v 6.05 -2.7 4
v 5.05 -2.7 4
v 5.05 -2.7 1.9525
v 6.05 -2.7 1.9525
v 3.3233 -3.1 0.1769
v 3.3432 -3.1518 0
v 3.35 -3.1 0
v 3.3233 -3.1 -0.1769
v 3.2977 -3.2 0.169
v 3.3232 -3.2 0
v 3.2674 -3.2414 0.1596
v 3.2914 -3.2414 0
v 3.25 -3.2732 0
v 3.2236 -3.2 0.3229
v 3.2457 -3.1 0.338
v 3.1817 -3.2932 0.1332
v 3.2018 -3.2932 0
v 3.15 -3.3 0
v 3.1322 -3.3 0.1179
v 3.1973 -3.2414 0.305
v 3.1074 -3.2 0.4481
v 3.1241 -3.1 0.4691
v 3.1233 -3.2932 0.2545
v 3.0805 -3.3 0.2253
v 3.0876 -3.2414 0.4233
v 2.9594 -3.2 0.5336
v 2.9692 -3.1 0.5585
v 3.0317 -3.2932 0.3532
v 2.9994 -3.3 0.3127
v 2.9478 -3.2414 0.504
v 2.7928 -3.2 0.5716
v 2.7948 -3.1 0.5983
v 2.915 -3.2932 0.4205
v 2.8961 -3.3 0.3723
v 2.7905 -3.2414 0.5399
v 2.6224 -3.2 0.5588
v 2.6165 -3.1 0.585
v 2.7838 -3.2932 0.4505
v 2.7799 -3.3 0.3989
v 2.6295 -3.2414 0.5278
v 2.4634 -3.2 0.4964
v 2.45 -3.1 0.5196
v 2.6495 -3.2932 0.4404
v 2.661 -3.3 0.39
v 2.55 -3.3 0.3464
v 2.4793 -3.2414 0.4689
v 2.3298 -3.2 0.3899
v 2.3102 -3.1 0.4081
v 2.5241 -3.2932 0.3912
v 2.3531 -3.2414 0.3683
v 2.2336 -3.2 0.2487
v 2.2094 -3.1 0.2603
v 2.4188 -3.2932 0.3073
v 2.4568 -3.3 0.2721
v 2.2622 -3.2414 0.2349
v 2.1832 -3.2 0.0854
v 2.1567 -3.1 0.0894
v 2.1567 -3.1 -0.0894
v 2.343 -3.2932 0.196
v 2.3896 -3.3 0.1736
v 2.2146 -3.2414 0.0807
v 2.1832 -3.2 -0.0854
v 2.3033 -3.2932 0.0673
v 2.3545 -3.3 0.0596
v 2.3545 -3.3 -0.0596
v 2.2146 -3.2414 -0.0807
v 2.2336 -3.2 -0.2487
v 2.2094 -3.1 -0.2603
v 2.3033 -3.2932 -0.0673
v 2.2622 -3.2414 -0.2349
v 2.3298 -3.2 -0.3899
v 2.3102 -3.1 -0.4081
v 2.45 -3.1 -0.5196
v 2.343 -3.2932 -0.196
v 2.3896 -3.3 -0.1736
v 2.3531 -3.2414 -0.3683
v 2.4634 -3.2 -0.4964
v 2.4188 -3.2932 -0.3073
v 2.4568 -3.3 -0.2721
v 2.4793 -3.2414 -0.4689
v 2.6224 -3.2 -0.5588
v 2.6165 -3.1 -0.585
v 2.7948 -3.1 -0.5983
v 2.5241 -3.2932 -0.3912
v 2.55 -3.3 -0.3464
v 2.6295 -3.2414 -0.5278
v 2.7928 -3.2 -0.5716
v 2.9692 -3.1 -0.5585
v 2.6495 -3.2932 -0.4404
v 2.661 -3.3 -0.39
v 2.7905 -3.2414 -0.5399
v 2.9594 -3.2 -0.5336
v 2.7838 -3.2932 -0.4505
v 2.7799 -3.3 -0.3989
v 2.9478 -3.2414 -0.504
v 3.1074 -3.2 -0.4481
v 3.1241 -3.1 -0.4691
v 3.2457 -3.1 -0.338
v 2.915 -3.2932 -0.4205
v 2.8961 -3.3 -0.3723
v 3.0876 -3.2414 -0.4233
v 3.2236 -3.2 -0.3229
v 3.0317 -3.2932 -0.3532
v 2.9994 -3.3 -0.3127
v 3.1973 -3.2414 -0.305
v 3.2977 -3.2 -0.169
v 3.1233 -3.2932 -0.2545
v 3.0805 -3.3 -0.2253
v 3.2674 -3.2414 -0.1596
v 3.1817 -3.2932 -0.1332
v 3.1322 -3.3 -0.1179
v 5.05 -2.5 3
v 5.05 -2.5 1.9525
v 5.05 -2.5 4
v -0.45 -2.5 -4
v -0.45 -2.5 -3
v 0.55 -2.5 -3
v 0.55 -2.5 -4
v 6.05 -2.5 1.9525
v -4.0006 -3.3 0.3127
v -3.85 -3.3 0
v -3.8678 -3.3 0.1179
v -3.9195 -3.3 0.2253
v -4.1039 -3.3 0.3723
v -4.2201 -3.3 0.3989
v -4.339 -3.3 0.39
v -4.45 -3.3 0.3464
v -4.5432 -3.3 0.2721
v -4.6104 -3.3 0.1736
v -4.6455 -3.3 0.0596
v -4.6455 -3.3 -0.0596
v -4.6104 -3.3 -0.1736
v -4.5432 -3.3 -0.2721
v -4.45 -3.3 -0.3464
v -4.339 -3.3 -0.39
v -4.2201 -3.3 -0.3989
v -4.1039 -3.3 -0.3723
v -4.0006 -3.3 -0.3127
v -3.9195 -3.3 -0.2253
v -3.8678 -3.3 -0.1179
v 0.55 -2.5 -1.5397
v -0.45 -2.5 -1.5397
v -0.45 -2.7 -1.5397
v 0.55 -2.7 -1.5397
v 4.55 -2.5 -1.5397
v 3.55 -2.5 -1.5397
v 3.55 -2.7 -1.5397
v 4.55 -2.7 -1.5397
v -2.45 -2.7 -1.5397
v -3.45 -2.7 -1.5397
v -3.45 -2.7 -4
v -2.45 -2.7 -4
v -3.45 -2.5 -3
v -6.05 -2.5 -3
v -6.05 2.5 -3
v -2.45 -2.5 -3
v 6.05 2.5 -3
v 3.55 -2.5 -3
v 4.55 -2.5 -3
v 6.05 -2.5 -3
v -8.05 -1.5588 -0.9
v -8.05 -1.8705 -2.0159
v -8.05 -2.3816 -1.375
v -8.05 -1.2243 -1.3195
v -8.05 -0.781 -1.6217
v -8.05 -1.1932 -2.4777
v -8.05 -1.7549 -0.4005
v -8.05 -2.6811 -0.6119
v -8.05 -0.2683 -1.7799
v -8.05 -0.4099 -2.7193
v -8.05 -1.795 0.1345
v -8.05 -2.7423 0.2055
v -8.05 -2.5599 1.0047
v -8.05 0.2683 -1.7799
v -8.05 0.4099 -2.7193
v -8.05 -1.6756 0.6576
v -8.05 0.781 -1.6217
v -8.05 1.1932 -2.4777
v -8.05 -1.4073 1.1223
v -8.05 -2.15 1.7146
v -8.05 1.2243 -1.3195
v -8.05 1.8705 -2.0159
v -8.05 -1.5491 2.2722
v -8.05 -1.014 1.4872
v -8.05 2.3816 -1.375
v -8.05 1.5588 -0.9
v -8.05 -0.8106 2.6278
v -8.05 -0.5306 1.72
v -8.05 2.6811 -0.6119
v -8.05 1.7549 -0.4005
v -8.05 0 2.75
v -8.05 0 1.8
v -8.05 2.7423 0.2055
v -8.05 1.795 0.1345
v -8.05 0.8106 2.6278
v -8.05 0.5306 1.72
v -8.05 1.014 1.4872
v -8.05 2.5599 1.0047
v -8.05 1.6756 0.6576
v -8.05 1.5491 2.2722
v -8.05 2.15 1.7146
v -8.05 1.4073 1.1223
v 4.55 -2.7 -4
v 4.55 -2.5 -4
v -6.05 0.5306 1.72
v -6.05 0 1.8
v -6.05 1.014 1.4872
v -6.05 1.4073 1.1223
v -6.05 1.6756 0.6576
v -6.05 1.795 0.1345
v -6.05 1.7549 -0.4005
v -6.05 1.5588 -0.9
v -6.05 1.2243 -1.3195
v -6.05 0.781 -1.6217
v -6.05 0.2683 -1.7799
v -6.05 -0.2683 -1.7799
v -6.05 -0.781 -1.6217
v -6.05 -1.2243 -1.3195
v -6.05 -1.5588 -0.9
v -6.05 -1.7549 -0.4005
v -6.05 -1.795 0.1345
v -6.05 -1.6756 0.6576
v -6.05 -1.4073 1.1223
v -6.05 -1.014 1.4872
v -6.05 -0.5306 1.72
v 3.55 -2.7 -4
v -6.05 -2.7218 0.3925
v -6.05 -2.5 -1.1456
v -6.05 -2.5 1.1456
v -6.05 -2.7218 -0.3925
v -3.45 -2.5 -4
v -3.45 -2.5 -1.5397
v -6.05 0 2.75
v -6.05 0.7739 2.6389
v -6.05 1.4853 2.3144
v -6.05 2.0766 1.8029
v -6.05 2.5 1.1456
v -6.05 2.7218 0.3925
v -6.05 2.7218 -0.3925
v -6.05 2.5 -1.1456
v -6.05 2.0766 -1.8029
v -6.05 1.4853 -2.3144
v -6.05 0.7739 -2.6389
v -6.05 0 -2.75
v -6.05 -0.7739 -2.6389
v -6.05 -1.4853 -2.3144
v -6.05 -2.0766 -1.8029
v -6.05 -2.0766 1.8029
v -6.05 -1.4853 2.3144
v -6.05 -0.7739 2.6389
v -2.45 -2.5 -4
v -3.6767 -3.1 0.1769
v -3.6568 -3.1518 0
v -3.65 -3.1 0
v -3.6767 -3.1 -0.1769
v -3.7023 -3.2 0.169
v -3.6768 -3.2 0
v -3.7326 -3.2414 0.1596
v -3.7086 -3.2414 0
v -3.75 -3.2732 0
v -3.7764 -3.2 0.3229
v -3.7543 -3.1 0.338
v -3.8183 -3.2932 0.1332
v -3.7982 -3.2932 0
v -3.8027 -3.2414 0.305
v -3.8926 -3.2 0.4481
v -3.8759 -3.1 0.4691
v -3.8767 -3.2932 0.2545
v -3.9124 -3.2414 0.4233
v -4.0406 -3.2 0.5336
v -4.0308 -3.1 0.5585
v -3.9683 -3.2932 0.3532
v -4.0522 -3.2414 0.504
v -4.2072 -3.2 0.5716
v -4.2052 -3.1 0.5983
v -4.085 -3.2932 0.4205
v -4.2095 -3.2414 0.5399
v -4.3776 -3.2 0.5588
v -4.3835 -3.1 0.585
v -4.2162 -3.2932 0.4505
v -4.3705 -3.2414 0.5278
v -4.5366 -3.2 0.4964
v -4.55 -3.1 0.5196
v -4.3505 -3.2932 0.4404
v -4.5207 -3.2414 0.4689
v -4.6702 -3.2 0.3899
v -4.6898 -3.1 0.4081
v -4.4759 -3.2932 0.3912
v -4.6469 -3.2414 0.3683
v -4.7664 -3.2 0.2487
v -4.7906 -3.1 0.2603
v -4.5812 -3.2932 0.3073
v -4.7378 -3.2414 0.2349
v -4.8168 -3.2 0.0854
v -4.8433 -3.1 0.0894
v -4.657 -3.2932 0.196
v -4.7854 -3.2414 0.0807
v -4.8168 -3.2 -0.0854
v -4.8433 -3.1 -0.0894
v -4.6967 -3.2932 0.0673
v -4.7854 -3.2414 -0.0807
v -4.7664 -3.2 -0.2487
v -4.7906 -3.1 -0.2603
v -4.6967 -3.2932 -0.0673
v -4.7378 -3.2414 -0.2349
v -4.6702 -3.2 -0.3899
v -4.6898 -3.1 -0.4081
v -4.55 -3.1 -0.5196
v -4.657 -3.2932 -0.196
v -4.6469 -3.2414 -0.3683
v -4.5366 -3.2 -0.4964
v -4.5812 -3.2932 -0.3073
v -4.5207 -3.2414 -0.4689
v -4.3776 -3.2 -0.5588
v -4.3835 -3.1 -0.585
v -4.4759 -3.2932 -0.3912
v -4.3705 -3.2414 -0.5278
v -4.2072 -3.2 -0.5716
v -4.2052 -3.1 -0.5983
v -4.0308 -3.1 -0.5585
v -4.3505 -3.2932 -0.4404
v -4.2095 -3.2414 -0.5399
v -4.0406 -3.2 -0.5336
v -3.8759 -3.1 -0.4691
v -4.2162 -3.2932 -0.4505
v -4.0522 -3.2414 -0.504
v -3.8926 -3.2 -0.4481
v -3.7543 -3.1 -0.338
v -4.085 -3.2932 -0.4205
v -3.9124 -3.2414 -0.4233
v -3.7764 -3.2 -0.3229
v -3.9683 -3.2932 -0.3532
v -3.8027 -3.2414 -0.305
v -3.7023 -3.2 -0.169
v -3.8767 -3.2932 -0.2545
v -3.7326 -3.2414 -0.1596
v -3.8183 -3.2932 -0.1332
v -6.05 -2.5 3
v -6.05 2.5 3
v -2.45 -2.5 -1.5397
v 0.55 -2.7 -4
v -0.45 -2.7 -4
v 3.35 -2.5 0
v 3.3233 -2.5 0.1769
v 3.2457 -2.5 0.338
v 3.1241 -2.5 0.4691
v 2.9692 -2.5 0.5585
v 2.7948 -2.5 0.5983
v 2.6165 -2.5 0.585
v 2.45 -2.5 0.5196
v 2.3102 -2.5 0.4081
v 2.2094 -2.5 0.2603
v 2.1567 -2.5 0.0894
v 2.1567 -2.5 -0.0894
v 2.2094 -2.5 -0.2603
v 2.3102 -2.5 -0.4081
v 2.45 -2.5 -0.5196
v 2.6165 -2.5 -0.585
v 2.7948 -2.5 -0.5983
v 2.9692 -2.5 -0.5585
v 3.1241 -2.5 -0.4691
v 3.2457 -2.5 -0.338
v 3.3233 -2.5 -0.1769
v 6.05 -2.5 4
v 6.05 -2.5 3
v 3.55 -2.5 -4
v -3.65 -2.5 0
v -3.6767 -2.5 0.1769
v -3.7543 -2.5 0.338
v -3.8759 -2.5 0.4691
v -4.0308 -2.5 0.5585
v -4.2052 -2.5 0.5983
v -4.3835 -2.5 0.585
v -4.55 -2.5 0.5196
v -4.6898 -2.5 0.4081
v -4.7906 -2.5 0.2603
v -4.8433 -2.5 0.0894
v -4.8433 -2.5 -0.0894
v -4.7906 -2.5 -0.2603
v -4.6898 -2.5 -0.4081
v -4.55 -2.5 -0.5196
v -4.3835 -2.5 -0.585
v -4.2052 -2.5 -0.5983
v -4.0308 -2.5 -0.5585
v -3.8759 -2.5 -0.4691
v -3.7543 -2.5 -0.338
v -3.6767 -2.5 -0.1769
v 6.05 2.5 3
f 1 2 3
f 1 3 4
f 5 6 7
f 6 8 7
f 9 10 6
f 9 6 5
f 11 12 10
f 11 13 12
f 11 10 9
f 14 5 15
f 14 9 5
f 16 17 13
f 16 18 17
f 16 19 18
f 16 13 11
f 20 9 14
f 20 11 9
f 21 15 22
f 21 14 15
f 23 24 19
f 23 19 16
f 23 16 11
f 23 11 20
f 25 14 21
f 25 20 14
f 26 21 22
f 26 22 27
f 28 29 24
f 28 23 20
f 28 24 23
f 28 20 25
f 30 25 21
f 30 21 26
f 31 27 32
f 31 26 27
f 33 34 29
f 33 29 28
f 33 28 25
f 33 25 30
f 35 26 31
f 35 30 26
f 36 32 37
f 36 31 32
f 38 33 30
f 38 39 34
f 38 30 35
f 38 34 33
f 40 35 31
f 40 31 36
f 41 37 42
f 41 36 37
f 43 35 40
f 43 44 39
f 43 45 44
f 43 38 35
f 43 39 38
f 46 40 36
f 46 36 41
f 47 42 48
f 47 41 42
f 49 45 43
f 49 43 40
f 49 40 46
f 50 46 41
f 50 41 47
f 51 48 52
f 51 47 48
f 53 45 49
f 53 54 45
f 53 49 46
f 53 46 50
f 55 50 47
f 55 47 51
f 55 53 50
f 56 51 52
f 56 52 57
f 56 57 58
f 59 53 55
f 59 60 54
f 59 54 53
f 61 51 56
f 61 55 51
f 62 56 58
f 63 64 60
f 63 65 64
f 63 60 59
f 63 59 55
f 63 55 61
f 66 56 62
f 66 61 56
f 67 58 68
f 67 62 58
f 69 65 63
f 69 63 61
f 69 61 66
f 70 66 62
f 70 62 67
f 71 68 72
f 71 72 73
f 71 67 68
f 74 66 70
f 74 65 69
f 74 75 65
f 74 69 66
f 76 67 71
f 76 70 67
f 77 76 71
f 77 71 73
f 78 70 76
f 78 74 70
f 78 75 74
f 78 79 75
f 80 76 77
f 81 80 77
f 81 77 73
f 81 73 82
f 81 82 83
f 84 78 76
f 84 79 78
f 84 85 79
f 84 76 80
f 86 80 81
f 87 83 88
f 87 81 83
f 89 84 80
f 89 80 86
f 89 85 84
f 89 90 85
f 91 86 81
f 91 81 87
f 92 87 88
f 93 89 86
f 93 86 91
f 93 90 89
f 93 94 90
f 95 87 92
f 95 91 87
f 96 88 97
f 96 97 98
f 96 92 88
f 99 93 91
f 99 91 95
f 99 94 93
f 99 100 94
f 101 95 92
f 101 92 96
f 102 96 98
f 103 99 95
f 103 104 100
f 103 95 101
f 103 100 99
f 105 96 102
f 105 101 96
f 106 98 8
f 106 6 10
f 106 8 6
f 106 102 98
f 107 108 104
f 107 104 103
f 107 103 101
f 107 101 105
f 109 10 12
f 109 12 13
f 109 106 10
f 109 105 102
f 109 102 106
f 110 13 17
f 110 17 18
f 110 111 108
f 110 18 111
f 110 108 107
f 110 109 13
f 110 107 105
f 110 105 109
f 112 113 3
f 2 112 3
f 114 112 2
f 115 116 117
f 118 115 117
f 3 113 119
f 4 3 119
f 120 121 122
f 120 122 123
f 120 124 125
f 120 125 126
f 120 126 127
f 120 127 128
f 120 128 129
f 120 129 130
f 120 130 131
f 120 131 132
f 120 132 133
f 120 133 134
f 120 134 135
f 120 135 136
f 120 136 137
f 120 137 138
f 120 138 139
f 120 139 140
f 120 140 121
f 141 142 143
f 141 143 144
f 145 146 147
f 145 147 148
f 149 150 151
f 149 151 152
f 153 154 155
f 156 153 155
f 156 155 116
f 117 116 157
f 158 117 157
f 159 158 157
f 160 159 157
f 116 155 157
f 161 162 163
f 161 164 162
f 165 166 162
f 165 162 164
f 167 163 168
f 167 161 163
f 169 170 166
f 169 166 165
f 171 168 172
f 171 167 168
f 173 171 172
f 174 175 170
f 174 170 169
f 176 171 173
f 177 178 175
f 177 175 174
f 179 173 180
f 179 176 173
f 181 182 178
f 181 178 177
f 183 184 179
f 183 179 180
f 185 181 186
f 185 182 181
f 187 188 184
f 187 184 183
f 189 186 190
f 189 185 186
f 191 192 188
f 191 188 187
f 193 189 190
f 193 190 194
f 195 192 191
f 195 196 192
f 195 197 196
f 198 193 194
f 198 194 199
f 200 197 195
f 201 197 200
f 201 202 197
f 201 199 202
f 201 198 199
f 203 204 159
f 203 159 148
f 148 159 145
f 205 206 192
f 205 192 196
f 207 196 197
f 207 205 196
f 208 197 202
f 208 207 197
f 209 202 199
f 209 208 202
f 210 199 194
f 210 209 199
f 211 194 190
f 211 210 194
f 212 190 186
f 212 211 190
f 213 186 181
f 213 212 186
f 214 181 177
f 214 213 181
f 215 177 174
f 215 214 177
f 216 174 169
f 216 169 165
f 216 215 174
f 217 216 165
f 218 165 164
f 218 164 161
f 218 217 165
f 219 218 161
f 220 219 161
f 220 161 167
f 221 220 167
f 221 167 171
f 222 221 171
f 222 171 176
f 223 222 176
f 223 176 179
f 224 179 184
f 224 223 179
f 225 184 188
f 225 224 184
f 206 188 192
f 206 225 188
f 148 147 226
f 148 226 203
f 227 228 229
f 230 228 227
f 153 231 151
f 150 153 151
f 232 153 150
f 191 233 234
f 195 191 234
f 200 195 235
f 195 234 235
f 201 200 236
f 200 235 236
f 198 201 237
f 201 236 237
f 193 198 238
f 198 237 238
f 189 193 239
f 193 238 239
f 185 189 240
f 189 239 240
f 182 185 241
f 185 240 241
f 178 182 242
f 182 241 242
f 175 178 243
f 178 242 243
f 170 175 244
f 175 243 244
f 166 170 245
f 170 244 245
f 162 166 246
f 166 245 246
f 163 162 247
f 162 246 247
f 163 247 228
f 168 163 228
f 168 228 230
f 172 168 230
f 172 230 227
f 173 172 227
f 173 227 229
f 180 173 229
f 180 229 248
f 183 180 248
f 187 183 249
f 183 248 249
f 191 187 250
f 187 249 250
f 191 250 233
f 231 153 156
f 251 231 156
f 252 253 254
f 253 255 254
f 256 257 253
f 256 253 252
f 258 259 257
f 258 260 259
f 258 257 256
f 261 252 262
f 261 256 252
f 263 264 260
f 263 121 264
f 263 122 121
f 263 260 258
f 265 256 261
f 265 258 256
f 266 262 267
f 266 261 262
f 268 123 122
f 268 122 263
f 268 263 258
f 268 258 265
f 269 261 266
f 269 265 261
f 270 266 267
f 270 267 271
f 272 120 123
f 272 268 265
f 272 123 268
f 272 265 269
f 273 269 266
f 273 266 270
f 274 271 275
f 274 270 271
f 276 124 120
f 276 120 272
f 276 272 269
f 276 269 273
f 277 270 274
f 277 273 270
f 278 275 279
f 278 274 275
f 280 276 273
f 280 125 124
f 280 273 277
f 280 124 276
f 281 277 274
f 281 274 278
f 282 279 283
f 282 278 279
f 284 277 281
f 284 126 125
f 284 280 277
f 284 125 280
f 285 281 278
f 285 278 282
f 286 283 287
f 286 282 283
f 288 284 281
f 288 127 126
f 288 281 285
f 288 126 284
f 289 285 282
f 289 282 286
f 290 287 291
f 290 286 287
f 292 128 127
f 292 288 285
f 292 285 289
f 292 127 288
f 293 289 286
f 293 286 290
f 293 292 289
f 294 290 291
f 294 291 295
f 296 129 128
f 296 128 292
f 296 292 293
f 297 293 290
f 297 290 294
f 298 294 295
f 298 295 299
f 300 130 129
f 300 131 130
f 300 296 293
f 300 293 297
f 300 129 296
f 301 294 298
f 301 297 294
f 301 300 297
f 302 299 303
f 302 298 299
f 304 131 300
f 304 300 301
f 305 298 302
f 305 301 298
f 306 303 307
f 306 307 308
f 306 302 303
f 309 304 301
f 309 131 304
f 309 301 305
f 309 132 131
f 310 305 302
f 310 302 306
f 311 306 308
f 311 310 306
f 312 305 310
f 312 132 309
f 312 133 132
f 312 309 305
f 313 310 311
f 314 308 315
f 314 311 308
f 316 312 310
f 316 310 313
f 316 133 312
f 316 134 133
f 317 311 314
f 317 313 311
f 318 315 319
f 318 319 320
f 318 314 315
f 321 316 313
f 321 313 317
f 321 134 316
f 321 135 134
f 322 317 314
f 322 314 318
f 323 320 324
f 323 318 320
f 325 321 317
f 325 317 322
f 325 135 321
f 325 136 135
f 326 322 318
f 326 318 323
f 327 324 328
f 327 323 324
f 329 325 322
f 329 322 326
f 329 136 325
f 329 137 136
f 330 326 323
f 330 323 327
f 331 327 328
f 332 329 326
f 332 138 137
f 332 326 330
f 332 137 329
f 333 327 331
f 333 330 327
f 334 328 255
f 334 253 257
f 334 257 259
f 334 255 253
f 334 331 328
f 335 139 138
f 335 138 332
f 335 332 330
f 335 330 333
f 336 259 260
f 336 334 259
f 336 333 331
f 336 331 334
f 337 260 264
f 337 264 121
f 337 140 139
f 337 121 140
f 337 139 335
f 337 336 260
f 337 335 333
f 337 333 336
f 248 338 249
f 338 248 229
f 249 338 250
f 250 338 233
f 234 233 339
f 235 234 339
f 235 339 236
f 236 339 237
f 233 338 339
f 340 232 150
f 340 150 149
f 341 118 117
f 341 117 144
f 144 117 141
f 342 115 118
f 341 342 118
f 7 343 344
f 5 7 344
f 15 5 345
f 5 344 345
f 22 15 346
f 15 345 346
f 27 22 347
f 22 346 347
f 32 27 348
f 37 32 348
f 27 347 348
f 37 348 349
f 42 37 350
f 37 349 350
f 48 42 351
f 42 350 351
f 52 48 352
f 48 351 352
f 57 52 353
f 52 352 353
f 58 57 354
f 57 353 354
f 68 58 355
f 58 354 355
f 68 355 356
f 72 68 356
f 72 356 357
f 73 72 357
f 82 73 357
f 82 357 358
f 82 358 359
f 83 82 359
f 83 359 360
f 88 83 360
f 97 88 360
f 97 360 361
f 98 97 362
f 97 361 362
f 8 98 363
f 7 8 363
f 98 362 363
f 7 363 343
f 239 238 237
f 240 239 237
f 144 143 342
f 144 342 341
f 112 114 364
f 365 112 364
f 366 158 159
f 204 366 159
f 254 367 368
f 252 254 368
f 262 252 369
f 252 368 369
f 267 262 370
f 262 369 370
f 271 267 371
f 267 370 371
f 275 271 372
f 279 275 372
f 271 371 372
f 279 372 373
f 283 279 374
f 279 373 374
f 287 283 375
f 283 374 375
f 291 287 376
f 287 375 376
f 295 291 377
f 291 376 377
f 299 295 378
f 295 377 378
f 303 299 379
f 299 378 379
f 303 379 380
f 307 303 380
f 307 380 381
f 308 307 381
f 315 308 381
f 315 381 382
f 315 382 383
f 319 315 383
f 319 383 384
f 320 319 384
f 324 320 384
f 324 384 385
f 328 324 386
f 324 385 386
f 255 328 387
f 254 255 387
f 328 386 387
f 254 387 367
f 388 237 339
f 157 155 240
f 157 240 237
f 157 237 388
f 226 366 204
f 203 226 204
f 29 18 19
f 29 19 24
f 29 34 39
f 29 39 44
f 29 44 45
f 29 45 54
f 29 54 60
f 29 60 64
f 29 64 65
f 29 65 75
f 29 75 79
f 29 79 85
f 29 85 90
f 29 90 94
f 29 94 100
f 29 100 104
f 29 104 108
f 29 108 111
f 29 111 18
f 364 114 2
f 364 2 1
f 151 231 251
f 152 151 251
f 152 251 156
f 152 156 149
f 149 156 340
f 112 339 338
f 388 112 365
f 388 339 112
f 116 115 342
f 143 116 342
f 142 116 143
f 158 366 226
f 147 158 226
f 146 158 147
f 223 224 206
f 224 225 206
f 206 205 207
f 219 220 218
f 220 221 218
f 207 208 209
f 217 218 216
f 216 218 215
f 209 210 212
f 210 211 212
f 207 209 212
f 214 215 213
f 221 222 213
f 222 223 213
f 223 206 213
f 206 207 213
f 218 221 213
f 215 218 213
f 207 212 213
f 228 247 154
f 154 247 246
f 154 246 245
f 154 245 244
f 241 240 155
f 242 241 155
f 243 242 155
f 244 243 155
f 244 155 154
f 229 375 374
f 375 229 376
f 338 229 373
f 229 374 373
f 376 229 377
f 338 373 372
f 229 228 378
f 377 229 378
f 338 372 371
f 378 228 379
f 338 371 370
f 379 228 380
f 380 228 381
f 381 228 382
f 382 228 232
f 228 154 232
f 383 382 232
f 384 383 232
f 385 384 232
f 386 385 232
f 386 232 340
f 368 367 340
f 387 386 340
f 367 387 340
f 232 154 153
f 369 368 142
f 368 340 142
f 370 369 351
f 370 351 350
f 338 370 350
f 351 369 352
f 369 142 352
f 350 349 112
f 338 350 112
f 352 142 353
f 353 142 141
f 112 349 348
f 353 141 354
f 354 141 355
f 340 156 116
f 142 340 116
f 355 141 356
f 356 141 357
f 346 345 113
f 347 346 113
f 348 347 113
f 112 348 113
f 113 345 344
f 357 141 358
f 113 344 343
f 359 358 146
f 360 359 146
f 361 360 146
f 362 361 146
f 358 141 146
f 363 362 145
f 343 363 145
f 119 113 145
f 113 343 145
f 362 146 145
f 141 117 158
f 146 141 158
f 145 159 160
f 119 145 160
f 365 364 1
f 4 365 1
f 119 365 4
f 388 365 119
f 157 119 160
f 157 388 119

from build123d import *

# Parameters (mm, degrees)
SKETCH1_W           = 12.1
SKETCH1_H           = 6
BOSS_EXTRUDE1_DEPTH = 2.5
SKETCH2_R           = 2.75
SKETCH2_R_2         = 1.8
BOSS_EXTRUDE2_DEPTH = 2
SKETCH3_R           = 0.6
BOSS_EXTRUDE3_DEPTH = 0.8
FILLET1_R           = 0.2
SKETCH4_W           = 1
SKETCH4_H           = 2.460309858
SKETCH4_H_2         = 2.047502849
BOSS_EXTRUDE4_DEPTH = 0.2


with BuildPart() as part:
    # Sketch1 → Boss-Extrude1 (new body, symmetric)
    with BuildSketch(Plane(origin=(0, 0, 0), x_dir=(1, 0, 0), z_dir=(0, 1, 0))):
        Rectangle(SKETCH1_W, SKETCH1_H)
    extrude(amount=BOSS_EXTRUDE1_DEPTH, both=True)

    # Sketch2 → Boss-Extrude2 (add)
    with BuildSketch(Plane.ZY.offset(6.05)):
        Circle(SKETCH2_R)
        Circle(SKETCH2_R_2, mode=Mode.SUBTRACT)
    extrude(amount=BOSS_EXTRUDE2_DEPTH)

    # Sketch3 → Boss-Extrude3 (add)
    with BuildSketch(Plane.XZ.offset(2.5)):
        with Locations((-4.25, 0)):
            Circle(SKETCH3_R)
        with Locations((2.75, 0)):
            Circle(SKETCH3_R)
    extrude(amount=BOSS_EXTRUDE3_DEPTH)

    # Fillet1
    fillet1_edges = [part.edges().sort_by_distance(p)[0] for p in [
        (-4.85, -3.3, 0),
        (2.15, -3.3, 0),
    ]]
    fillet(fillet1_edges, radius=FILLET1_R)

    # Sketch4 → Boss-Extrude4 (add)
    with BuildSketch(Plane.XZ.offset(2.5)):
        with Locations((-2.95, -2.769845071)):
            Rectangle(SKETCH4_W, SKETCH4_H)
        with Locations((0.05, -2.769845071)):
            Rectangle(SKETCH4_W, SKETCH4_H)
        with Locations((4.05, -2.769845071)):
            Rectangle(SKETCH4_W, SKETCH4_H)
        with Locations((5.55, 2.976248576)):
            Rectangle(SKETCH4_W, SKETCH4_H_2)
    extrude(amount=BOSS_EXTRUDE4_DEPTH)


solid = part.part
